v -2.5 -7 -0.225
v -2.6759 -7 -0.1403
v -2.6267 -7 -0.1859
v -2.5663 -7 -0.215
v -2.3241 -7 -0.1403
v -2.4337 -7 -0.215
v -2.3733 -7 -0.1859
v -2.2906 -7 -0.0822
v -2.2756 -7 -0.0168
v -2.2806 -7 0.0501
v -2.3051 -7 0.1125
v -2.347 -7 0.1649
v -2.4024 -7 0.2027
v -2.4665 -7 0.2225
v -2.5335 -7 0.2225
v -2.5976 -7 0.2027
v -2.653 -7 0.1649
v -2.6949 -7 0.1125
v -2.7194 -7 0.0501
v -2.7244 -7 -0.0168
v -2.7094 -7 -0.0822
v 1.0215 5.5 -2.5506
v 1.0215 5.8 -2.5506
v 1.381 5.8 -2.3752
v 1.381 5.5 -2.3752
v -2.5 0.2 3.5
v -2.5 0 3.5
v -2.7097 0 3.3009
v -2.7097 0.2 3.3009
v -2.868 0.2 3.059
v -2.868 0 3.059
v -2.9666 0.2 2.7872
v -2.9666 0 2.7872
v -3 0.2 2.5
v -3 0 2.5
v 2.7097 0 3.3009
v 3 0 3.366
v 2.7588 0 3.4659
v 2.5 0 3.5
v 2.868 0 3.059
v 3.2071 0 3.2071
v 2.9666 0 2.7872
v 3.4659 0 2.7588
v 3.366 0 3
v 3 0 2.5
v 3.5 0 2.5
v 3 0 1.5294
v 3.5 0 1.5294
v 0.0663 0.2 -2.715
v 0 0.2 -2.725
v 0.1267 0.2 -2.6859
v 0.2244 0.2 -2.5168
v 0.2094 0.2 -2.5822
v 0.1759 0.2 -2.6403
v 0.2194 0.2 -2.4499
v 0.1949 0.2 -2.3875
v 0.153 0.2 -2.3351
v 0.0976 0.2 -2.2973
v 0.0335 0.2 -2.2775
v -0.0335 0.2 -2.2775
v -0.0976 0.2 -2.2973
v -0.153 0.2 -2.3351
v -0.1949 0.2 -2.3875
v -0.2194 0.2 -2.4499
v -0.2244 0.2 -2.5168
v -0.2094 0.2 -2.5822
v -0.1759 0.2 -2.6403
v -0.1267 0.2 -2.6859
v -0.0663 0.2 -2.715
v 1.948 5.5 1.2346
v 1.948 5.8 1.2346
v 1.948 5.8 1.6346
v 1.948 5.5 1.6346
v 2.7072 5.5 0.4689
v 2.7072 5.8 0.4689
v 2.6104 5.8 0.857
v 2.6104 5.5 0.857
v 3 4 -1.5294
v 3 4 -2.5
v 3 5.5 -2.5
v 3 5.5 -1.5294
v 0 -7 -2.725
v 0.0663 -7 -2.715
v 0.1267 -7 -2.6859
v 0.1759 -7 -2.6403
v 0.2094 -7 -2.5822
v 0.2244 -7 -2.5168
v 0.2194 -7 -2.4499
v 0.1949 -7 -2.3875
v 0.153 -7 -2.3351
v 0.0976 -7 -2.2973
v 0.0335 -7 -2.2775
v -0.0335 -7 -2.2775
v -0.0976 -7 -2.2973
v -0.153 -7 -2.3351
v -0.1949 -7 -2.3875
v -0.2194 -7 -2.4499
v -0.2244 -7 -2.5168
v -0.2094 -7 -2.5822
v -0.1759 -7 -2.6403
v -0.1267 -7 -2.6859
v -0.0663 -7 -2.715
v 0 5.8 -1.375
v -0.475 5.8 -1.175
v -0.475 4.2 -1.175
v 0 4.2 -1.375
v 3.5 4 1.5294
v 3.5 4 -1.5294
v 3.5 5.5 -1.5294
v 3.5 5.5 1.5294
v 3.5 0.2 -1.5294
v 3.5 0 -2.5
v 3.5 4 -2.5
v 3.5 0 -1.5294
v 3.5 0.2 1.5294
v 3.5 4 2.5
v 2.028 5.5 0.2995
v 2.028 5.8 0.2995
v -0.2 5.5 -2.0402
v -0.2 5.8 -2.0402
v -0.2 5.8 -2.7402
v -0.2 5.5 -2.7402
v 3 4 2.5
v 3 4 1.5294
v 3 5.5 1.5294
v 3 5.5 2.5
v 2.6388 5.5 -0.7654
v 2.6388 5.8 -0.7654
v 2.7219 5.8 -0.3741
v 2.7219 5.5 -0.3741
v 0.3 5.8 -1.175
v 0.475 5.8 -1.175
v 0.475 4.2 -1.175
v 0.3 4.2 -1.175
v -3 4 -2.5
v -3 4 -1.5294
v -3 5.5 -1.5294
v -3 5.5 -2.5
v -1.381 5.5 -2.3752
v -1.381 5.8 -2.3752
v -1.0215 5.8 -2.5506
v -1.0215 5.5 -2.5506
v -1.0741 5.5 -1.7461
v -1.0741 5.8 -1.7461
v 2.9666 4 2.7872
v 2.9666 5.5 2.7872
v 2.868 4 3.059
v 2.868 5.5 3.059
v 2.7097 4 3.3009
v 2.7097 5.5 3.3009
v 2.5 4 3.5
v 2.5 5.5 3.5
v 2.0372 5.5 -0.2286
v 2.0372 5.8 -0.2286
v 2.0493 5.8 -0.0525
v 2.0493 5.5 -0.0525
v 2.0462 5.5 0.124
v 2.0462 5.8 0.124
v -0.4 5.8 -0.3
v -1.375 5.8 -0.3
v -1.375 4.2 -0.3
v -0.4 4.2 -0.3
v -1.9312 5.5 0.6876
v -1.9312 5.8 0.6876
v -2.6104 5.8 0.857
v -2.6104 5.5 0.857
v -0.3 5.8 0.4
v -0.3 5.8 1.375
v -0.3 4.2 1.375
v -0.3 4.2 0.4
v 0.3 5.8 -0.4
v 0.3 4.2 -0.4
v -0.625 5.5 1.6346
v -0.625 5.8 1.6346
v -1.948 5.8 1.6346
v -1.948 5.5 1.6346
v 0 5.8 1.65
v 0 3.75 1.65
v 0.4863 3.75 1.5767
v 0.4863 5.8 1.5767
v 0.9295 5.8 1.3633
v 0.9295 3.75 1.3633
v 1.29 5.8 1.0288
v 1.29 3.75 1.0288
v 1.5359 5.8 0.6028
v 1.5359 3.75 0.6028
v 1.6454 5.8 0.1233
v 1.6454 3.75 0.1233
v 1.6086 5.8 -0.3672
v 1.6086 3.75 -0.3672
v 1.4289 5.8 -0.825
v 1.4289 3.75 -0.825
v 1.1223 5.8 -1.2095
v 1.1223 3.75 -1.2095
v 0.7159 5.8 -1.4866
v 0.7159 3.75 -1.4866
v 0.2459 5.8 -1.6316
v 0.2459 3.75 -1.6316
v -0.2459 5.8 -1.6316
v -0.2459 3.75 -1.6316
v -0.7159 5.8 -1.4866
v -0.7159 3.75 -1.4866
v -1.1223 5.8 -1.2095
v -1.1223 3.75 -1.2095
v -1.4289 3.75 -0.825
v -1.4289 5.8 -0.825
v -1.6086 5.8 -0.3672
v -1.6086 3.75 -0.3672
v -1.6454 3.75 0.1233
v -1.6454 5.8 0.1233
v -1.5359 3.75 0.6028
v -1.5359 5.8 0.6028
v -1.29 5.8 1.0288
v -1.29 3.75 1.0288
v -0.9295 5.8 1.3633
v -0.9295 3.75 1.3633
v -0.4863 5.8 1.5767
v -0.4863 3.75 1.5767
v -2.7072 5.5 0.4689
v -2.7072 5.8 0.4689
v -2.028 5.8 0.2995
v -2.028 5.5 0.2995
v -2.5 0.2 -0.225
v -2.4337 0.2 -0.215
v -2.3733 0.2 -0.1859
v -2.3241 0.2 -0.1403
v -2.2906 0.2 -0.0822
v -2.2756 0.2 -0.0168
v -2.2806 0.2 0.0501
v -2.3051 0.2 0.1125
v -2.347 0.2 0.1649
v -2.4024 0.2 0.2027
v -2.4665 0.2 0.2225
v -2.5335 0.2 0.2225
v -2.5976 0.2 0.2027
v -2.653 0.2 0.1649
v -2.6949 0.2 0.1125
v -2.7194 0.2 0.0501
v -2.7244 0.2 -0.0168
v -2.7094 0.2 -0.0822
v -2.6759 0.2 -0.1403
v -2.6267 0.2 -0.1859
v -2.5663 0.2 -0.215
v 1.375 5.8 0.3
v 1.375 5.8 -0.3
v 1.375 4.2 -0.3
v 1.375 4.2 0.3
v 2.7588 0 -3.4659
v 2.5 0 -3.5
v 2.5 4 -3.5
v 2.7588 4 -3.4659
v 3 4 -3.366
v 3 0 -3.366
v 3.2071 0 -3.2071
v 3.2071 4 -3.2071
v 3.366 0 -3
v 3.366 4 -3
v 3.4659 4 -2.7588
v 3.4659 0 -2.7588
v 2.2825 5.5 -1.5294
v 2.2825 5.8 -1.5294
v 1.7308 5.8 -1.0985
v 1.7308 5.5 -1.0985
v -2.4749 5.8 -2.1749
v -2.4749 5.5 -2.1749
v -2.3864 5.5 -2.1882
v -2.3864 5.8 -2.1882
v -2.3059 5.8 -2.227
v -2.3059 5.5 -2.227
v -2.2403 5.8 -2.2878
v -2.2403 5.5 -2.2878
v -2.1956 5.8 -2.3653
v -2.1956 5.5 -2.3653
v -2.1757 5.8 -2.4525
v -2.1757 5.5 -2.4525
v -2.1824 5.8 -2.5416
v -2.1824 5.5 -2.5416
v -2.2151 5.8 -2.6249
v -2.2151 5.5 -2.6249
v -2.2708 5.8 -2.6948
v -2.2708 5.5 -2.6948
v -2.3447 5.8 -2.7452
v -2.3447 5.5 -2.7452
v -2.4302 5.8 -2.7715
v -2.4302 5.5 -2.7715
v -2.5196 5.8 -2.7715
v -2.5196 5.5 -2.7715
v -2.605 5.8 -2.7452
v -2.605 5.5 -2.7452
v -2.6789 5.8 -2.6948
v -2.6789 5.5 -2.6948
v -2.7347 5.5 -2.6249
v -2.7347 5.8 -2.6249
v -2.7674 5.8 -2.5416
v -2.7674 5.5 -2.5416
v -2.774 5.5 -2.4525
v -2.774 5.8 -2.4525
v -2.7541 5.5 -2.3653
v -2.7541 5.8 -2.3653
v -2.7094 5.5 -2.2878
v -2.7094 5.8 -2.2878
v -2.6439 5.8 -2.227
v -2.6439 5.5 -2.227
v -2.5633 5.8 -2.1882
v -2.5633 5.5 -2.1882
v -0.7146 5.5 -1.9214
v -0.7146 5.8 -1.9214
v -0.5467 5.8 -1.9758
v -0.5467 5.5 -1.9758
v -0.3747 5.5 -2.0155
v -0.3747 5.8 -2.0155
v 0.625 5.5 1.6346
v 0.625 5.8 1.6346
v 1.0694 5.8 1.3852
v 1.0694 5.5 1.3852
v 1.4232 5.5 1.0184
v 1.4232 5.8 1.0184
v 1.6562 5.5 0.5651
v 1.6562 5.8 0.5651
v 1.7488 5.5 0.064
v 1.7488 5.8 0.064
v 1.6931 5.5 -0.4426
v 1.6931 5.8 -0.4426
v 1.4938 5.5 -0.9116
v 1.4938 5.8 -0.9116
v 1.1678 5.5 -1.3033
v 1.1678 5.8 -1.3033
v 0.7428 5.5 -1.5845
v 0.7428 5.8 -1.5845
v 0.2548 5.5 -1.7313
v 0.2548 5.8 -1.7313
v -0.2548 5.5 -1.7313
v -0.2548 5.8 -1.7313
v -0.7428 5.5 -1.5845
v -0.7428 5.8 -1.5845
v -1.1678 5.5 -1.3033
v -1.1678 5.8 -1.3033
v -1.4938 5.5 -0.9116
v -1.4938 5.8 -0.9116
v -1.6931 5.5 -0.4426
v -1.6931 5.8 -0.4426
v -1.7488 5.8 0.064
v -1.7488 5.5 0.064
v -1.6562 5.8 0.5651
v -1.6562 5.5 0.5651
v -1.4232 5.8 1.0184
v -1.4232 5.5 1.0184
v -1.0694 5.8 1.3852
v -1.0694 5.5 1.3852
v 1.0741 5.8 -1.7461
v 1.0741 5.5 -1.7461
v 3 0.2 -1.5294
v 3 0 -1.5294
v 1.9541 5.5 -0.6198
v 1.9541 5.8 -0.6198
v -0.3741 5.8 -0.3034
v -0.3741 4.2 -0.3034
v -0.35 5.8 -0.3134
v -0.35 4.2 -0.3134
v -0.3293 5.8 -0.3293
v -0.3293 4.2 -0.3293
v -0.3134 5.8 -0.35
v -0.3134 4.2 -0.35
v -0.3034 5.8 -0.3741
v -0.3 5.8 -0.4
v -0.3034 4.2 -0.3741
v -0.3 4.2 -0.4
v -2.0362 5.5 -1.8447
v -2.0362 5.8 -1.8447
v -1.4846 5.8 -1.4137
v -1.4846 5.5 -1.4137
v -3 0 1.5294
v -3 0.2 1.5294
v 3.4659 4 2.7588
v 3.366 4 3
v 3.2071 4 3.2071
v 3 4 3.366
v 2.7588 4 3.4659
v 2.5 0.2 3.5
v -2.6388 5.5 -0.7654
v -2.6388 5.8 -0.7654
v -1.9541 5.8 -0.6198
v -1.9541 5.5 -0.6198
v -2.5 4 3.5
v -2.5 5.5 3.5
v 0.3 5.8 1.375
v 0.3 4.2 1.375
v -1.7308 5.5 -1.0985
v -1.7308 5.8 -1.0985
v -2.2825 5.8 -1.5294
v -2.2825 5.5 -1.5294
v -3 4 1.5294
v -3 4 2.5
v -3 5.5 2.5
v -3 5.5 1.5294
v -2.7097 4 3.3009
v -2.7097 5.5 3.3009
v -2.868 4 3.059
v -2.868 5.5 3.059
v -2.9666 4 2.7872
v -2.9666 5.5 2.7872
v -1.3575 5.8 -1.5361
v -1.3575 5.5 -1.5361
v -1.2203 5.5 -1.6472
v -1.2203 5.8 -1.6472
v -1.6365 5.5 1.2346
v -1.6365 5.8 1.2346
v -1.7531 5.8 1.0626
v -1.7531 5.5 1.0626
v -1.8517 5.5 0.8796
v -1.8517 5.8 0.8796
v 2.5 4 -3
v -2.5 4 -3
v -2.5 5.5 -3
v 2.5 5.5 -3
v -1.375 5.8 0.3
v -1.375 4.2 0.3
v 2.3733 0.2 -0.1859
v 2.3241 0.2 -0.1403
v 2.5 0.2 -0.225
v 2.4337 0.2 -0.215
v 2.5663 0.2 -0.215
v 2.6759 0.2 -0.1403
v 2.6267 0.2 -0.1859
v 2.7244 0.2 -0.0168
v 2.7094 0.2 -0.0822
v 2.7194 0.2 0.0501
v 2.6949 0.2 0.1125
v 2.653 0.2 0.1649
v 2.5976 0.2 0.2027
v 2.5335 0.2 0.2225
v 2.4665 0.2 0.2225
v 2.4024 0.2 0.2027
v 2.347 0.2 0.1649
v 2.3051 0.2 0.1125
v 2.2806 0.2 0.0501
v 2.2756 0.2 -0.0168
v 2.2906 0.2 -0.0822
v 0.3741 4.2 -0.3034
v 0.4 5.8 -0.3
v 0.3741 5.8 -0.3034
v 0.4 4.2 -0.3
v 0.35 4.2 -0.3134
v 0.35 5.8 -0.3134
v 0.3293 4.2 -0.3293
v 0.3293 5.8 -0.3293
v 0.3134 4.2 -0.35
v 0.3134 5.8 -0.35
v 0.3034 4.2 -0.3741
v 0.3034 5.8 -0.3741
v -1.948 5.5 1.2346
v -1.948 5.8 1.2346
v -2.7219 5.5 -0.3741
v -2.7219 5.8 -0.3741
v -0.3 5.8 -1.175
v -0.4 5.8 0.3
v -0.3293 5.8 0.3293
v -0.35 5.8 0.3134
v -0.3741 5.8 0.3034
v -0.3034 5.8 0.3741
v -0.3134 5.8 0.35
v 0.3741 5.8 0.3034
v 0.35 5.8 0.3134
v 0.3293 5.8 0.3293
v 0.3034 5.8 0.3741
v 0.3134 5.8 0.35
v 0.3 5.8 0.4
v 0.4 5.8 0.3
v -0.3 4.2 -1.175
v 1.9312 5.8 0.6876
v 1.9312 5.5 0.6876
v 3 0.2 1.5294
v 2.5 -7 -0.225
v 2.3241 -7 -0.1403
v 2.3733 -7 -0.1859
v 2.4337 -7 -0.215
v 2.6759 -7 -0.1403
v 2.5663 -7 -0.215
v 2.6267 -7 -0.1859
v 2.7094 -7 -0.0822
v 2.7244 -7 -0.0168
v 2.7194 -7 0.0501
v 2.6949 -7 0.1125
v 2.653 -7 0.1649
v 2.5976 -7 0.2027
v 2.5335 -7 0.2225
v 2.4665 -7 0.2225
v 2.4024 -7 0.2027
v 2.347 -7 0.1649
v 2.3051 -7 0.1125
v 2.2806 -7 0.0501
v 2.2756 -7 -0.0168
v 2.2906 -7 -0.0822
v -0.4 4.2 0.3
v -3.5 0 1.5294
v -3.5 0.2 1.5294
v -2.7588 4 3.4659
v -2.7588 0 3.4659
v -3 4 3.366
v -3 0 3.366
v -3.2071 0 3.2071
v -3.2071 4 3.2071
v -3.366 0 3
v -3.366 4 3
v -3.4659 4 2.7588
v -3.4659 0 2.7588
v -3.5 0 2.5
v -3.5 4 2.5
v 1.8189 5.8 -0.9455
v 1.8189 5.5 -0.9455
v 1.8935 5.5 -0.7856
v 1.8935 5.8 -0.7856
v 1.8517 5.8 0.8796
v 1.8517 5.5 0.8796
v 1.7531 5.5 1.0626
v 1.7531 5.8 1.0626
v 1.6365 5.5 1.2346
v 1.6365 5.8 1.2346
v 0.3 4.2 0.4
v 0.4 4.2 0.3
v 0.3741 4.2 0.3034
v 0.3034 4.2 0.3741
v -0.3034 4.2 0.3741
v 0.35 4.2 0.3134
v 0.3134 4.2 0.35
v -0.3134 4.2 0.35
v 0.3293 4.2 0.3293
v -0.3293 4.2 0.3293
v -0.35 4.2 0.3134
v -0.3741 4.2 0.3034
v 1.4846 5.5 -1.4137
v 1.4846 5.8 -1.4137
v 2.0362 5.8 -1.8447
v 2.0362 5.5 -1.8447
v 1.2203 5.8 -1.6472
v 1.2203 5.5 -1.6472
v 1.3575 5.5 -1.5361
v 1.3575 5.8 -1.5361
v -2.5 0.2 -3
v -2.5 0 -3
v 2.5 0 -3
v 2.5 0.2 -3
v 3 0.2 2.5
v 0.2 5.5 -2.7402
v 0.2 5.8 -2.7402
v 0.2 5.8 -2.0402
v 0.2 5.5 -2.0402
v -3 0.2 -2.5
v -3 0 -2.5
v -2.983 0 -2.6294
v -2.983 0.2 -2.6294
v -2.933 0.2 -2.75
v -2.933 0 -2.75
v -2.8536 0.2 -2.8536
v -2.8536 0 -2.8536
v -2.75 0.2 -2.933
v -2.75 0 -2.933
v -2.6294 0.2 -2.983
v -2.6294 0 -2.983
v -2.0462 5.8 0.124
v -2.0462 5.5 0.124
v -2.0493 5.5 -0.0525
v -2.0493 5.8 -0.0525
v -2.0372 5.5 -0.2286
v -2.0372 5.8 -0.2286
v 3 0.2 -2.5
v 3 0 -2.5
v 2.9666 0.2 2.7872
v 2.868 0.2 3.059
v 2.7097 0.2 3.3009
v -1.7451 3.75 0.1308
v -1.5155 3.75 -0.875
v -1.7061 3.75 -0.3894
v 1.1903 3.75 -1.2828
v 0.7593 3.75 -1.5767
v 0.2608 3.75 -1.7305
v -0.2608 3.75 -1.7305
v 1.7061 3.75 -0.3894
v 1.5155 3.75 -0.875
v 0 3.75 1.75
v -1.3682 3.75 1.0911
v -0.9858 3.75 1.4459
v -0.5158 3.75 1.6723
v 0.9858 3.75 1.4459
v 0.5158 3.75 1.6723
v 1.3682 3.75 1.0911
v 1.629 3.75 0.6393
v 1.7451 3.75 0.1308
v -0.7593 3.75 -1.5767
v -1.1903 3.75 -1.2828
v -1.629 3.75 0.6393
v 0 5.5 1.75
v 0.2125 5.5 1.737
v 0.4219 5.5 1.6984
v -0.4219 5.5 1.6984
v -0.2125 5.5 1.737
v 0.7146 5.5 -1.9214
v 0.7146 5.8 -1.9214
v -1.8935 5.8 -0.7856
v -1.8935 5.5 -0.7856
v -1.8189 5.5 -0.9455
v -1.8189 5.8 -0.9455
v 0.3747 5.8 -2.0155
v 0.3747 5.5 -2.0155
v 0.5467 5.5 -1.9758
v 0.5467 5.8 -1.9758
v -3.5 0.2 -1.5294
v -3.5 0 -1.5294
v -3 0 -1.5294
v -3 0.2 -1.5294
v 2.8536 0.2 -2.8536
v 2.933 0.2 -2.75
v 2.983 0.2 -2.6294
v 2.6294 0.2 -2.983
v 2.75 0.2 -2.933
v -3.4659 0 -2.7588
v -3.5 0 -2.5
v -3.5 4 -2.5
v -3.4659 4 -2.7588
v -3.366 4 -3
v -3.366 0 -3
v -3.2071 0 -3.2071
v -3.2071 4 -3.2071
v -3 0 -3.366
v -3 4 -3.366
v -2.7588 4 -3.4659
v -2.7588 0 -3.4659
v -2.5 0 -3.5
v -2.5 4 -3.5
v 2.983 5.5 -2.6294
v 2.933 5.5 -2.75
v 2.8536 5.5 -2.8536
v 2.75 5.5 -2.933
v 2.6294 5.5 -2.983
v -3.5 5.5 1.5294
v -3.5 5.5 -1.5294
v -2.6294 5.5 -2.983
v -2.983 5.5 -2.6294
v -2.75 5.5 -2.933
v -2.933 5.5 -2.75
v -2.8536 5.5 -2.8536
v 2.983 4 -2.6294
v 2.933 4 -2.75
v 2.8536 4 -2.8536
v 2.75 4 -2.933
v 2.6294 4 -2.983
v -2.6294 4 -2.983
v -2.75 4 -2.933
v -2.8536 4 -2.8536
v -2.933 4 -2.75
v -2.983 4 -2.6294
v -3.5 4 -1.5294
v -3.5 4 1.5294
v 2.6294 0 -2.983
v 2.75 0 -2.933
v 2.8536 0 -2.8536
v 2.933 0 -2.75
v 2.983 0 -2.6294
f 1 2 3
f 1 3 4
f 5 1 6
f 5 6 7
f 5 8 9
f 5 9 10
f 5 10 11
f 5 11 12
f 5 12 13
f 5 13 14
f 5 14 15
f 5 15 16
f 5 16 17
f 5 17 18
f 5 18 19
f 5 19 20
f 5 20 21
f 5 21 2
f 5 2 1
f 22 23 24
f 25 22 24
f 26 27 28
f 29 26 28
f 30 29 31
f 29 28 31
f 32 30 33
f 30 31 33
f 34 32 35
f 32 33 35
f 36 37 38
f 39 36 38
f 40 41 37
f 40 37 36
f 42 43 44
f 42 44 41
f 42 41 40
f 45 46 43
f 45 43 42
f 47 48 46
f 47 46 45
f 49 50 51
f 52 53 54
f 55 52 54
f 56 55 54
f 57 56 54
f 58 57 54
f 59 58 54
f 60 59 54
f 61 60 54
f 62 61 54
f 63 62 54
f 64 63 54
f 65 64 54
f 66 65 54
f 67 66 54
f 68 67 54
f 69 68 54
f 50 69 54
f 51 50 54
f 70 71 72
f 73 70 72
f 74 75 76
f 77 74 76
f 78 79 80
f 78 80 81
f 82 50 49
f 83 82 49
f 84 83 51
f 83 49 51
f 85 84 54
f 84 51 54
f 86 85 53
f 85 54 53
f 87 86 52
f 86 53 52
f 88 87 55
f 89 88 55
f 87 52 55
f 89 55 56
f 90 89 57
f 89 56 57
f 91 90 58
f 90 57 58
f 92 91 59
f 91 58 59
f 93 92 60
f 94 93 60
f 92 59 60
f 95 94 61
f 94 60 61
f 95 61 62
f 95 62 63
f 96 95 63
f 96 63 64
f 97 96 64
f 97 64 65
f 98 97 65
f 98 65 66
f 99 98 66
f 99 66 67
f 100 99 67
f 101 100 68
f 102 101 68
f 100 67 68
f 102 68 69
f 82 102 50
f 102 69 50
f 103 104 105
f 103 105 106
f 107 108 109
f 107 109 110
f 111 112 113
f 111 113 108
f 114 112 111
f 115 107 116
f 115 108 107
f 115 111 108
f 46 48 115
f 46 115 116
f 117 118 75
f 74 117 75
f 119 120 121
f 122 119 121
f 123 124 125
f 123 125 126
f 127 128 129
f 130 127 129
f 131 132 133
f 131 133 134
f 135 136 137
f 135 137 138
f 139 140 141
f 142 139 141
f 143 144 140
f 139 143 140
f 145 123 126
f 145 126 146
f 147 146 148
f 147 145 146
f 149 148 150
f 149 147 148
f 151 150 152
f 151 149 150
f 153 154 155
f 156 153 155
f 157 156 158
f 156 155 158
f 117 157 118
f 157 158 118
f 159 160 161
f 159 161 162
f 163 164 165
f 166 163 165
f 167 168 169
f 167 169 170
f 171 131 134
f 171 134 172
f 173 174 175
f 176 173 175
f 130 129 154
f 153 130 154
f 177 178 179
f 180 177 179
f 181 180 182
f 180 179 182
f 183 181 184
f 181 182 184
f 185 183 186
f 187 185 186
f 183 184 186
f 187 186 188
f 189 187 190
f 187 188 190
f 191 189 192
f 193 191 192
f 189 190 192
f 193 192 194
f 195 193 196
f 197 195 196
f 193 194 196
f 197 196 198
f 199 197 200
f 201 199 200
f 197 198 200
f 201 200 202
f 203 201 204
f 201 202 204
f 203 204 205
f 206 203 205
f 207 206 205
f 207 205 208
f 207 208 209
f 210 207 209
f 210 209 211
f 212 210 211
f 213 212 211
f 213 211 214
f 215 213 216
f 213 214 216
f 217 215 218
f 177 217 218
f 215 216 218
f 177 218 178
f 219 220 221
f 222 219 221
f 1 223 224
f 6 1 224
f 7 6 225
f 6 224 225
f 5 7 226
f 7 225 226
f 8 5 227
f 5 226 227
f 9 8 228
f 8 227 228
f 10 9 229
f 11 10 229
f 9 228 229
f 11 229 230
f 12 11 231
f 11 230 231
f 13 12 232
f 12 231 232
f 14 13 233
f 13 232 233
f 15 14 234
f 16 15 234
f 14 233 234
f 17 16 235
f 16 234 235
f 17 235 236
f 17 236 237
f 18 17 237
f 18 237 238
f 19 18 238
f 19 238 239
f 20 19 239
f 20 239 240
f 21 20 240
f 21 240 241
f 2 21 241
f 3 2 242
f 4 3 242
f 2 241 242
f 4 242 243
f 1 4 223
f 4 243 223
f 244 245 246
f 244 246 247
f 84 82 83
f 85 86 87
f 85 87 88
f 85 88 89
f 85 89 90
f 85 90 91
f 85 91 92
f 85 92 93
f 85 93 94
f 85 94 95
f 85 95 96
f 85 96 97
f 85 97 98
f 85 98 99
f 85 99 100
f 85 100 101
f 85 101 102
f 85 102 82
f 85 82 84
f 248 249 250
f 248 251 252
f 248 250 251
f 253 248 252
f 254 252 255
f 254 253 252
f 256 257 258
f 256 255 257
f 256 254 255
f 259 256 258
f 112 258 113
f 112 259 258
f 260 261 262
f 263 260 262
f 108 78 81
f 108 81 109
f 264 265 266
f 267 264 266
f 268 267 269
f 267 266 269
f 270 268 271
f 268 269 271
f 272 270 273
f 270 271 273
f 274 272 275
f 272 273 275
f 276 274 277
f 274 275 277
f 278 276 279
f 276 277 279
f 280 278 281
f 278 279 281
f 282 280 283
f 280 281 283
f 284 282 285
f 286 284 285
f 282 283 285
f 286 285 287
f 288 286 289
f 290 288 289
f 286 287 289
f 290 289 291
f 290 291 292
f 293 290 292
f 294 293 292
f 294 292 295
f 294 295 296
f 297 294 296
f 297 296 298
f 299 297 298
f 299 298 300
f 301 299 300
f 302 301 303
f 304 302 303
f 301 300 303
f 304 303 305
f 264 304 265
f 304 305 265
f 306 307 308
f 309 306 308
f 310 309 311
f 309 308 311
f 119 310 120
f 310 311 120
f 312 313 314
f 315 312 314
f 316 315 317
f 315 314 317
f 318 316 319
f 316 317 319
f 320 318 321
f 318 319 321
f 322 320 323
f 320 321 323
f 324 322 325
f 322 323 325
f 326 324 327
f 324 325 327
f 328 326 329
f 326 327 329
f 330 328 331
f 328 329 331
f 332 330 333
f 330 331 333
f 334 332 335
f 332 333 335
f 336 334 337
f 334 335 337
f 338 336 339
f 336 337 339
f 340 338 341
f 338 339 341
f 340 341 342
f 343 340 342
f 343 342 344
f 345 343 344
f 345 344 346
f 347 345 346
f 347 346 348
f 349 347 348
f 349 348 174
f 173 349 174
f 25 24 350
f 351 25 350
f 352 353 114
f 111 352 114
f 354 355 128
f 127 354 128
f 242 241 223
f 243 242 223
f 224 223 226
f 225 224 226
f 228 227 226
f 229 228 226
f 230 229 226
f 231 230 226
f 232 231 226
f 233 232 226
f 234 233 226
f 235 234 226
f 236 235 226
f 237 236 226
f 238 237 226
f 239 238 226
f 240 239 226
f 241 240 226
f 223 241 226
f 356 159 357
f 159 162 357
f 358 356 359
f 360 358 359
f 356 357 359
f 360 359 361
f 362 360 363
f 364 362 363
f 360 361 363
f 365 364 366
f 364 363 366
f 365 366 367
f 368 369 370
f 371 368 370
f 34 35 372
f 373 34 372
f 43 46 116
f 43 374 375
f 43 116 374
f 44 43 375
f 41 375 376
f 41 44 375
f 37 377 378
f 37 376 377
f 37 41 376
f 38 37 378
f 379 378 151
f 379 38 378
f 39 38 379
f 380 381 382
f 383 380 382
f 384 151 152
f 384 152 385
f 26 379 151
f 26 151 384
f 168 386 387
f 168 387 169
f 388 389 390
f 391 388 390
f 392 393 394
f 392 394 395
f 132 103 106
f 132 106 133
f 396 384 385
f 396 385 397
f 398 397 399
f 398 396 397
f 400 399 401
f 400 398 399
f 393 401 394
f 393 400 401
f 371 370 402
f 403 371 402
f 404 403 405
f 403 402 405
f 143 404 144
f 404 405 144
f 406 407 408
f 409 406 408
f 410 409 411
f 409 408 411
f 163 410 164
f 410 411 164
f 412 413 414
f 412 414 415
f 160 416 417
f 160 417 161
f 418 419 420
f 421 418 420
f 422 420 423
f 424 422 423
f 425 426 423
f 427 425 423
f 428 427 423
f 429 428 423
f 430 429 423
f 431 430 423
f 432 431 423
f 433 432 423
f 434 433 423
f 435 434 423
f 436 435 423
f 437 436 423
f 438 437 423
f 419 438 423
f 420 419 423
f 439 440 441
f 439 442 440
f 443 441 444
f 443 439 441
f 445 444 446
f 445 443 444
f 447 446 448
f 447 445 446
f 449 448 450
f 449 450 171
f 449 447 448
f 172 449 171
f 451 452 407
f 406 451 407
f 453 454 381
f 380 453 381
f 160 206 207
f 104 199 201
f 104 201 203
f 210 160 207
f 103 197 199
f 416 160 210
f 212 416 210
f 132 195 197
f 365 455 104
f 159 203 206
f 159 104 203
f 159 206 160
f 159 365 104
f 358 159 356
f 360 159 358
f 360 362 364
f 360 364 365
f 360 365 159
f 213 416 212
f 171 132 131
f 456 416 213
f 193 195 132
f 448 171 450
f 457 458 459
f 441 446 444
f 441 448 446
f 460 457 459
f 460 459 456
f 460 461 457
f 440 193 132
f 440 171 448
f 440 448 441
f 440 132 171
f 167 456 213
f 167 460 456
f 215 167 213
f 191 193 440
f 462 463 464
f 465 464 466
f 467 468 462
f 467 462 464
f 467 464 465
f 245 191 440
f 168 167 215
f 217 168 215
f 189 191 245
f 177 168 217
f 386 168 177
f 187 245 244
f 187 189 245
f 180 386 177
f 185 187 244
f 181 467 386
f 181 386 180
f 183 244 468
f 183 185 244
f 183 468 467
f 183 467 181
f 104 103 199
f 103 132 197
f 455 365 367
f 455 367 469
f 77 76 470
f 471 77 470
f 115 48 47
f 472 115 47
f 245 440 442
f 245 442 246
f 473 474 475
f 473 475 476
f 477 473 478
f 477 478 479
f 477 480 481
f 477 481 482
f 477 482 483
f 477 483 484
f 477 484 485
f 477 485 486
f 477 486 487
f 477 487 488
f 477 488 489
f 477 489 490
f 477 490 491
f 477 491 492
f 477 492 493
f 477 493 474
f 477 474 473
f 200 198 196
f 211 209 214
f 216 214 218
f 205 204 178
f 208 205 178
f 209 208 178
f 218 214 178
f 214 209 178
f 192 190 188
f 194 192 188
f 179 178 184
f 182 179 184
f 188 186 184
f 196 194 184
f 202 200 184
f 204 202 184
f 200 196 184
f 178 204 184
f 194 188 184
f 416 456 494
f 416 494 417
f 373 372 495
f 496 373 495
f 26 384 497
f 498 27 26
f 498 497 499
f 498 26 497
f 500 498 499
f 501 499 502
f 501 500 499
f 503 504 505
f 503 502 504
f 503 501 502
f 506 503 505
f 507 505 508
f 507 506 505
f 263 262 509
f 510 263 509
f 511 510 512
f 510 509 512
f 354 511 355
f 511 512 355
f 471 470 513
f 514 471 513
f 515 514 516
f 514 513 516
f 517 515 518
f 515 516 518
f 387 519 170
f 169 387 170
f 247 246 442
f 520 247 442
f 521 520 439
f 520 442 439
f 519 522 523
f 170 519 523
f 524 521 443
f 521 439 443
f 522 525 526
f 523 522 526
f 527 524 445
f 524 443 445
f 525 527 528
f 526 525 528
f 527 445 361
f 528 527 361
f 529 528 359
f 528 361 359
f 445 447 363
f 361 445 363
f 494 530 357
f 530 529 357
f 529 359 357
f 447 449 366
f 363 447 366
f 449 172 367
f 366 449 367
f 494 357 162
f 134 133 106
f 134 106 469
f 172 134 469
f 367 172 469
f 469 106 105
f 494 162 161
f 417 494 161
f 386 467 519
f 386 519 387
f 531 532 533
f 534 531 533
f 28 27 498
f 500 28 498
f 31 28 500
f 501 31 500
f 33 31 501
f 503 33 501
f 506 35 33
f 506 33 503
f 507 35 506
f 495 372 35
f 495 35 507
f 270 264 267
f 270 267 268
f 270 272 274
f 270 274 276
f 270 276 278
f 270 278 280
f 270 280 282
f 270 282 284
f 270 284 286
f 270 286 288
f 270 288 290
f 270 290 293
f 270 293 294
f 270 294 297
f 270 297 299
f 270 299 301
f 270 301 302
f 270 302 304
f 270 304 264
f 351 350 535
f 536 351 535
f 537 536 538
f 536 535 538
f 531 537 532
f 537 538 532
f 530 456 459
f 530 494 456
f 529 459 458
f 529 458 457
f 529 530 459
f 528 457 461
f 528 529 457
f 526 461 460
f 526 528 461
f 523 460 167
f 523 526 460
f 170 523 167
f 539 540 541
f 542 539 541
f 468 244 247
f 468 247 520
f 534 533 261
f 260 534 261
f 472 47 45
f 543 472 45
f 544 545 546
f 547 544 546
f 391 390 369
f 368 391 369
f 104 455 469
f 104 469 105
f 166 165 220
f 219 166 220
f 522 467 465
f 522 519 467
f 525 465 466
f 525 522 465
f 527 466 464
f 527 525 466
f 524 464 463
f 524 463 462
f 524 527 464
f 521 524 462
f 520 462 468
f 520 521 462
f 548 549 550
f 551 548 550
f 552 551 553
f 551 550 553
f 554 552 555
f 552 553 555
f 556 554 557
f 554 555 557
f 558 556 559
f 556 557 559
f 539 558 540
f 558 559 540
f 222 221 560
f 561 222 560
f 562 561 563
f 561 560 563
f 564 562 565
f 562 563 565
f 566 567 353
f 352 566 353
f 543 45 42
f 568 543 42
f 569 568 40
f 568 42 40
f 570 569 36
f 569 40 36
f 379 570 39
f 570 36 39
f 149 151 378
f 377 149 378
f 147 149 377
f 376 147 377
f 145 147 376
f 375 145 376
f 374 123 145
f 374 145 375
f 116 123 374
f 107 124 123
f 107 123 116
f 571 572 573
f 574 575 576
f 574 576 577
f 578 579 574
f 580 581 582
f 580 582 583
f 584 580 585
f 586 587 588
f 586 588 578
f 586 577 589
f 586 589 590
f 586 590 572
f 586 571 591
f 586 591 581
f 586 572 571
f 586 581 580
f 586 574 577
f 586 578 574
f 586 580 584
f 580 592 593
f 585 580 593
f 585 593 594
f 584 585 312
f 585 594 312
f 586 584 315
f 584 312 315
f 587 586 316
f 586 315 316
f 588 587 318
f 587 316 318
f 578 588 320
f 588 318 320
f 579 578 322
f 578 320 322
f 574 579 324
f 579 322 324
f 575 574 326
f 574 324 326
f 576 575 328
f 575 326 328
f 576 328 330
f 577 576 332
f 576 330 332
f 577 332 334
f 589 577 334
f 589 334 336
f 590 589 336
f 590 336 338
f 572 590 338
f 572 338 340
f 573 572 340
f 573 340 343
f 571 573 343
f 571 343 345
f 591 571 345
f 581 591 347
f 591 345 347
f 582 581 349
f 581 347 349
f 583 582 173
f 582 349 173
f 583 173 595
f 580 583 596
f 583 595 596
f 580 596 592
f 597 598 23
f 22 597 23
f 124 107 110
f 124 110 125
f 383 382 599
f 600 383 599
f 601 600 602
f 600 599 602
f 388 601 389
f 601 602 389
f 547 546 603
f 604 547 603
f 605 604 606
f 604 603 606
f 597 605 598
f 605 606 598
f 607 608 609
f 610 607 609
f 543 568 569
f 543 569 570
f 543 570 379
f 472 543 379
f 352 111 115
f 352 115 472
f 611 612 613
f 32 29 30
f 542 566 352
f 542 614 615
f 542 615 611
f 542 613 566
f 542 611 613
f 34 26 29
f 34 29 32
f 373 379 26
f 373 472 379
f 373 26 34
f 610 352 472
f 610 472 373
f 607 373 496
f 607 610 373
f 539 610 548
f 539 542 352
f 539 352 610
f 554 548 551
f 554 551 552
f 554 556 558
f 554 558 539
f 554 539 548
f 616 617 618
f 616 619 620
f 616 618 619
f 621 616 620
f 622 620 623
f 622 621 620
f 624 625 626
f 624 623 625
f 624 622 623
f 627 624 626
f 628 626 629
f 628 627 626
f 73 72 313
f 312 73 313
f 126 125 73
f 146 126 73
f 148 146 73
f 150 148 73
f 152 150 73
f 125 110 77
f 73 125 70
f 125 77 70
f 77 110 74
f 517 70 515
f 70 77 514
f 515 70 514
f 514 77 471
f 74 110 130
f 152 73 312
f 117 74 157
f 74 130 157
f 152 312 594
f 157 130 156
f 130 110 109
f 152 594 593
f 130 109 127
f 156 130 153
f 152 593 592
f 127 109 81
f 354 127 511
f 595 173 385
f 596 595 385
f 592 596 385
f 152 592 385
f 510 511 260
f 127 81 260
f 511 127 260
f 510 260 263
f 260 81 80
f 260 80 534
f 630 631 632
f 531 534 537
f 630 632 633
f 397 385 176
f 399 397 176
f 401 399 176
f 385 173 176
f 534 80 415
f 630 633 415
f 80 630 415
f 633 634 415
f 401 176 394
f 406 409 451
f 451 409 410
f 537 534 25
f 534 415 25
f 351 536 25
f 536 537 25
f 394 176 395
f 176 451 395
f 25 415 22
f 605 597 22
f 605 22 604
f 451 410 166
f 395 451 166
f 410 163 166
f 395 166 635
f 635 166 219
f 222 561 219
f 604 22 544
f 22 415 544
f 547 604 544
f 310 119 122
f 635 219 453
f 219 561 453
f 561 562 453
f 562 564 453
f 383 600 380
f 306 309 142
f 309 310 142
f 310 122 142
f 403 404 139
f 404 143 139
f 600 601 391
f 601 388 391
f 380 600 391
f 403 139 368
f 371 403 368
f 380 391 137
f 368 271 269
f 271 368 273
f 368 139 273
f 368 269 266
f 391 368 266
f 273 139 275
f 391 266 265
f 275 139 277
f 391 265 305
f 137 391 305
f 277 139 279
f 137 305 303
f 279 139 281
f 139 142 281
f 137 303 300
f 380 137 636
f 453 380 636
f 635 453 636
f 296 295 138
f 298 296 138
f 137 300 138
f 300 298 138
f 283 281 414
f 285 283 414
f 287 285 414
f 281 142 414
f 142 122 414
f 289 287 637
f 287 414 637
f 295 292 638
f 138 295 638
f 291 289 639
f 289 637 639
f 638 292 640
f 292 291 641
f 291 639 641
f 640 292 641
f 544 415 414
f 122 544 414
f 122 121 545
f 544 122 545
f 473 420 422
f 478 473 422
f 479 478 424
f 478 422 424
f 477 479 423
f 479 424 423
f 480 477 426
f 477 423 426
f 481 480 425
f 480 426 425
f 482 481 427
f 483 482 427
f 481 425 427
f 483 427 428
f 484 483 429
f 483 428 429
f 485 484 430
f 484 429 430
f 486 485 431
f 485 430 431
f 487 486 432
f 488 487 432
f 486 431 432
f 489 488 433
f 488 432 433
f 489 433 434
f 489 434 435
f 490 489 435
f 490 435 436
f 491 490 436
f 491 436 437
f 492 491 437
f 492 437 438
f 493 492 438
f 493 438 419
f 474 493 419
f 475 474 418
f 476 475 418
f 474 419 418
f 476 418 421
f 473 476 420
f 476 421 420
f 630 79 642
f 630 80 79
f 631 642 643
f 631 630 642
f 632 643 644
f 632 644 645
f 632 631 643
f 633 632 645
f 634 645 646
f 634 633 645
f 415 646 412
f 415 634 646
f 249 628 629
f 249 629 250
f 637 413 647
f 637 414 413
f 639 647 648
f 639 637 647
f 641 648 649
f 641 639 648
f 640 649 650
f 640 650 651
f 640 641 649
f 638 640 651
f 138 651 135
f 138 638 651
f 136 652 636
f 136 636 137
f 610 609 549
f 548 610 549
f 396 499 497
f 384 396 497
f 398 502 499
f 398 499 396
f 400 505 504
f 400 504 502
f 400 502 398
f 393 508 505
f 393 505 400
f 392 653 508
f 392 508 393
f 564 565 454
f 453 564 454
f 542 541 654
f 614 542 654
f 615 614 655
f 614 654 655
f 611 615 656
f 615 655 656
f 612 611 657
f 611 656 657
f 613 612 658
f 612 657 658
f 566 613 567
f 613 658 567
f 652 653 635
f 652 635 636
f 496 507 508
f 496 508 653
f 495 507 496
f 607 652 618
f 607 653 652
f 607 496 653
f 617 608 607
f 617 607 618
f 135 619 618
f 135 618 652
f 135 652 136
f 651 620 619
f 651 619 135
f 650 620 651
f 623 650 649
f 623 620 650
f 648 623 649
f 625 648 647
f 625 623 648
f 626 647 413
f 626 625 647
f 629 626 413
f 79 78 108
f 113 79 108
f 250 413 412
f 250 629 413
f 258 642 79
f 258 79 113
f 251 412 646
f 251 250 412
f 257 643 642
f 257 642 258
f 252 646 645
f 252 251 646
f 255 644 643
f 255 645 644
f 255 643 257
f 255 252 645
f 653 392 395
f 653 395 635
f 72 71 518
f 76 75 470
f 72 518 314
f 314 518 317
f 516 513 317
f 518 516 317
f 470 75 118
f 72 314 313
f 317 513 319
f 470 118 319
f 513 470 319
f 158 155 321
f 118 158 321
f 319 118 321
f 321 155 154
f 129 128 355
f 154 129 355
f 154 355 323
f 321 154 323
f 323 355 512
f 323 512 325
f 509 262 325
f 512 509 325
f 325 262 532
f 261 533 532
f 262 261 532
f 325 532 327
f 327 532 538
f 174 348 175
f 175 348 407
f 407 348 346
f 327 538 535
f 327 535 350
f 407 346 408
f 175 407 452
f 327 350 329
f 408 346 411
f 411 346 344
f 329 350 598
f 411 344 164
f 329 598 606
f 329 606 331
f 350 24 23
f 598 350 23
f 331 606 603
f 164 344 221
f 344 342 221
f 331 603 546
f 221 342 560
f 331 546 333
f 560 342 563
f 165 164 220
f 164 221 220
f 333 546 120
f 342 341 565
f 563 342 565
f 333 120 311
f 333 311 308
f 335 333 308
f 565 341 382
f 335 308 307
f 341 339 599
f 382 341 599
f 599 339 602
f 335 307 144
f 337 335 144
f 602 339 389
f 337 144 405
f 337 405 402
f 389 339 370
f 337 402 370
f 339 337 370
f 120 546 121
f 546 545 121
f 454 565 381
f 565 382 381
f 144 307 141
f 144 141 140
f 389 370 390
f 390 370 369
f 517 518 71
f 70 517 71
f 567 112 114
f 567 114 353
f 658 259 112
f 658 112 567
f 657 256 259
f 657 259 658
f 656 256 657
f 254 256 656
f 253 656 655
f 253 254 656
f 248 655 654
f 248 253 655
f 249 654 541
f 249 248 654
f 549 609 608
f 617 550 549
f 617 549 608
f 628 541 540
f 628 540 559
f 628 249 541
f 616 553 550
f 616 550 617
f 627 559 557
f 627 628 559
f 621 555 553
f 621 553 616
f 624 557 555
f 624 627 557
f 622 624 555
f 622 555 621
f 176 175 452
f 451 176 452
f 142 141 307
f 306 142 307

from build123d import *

# Parameters (mm, degrees)
BOSS_EXTRUDE1_DEPTH   = 5.5
SKETCH3_R             = 1.75
CUT_EXTRUDE1_DEPTH    = 1.75
SKETCH4_R             = 1.65
BOSS_EXTRUDE2_DEPTH   = 2.05
CUT_EXTRUDE2_DEPTH    = 1.6
FILLET1_R             = 0.1
BOSS_EXTRUDE3_START   = 0.3
BOSS_EXTRUDE3_DEPTH   = 0.3
SKETCH7_R             = 0.3
BOSS_EXTRUDE4_DEPTH   = 0.3
CUT_EXTRUDE3_START    = -1.5
CUT_EXTRUDE3_DEPTH    = 1.5
FILLET2_R             = 0.5
CUT_EXTRUDE7_DEPTH    = 0.2
SKETCH11_R            = 0.225
BOSS_EXTRUDE6_DEPTH   = 7.2
BOSS_EXTRUDE6_2_DEPTH = 7.2
BOSS_EXTRUDE6_3_DEPTH = 7.2


with BuildPart() as part:
    # Sketch1 → Boss-Extrude1 (new body)
    with BuildSketch(Plane(origin=(0, 0, 0), x_dir=(1, 0, 0), z_dir=(0, 1, 0))):
        with BuildLine():
            Line((2.5, -3.5), (-2.5, -3.5))
            ThreePointArc((-2.5, -3.5), (-3.207106781, -3.207106781), (-3.5, -2.5))
            Line((-3.5, -2.5), (-3.5, 2.5))
            ThreePointArc((-3.5, 2.5), (-3.207106781, 3.207106781), (-2.5, 3.5))
            Line((-2.5, 3.5), (2.5, 3.5))
            ThreePointArc((2.5, 3.5), (3.207106781, 3.207106781), (3.5, 2.5))
            Line((3.5, 2.5), (3.5, -2.5))
            ThreePointArc((3.5, -2.5), (3.207106781, -3.207106781), (2.5, -3.5))
        make_face()
    extrude(amount=BOSS_EXTRUDE1_DEPTH)

    # Sketch3 → Cut-Extrude1 (cut)
    with BuildSketch(Plane(origin=(0, 5.5, 0), x_dir=(1, 0, 0), z_dir=(0, 1, 0))):
        with Locations(Location((0, 0, 0), (0, 0, 270))):
            Circle(SKETCH3_R)
    extrude(amount=-CUT_EXTRUDE1_DEPTH, mode=Mode.SUBTRACT)

    # Sketch6 → Boss-Extrude3 (add)
    with BuildSketch(Plane(origin=(0, 5.5, 0), x_dir=(1, 0, 0), z_dir=(0, 1, 0)).offset(BOSS_EXTRUDE3_START)):
        with BuildLine():
            Line((-0.625, -1.634587104), (-1.948025053, -1.634587104))
            Line((-1.948025053, -1.634587104), (-1.948025053, -1.234587104))
            Line((-1.948025053, -1.234587104), (-1.636549627, -1.234587104))
            ThreePointArc((-1.636549627, -1.234587104), (-1.804732041, -0.972338553), (-1.931232927, -0.687633175))
            Line((-1.931232927, -0.687633175), (-2.610439935, -0.856978501))
            Line((-2.610439935, -0.856978501), (-2.707208693, -0.468860211))
            Line((-2.707208693, -0.468860211), (-2.028001685, -0.299514884))
            ThreePointArc((-2.028001685, -0.299514884), (-2.049687775, -0.035777433), (-2.0372192, 0.22855619))
            Line((-2.0372192, 0.22855619), (-2.72192252, 0.374094373))
            Line((-2.72192252, 0.374094373), (-2.638757844, 0.765353413))
            Line((-2.638757844, 0.765353413), (-1.954054524, 0.61981523))
            ThreePointArc((-1.954054524, 0.61981523), (-1.857930963, 0.866367437), (-1.730848049, 1.098483059))
            Line((-1.730848049, 1.098483059), (-2.282455576, 1.529446092))
            Line((-2.282455576, 1.529446092), (-2.036190986, 1.844650393))
            Line((-2.036190986, 1.844650393), (-1.484583459, 1.413687361))
            ThreePointArc((-1.484583459, 1.413687361), (-1.290106802, 1.593149221), (-1.074132643, 1.746063878))
            Line((-1.074132643, 1.746063878), (-1.380992446, 2.37521971))
            Line((-1.380992446, 2.37521971), (-1.021474827, 2.550568169))
            Line((-1.021474827, 2.550568169), (-0.714615024, 1.921412336))
            ThreePointArc((-0.714615024, 1.921412336), (-0.461149661, 1.997458633), (-0.2, 2.040220576))
            Line((-0.2, 2.040220576), (-0.2, 2.740220576))
            Line((-0.2, 2.740220576), (0.2, 2.740220576))
            Line((0.2, 2.740220576), (0.2, 2.040220576))
            ThreePointArc((0.2, 2.040220576), (0.461149661, 1.997458633), (0.714615024, 1.921412336))
            Line((0.714615024, 1.921412336), (1.021474827, 2.550568169))
            Line((1.021474827, 2.550568169), (1.380992446, 2.37521971))
            Line((1.380992446, 2.37521971), (1.074132643, 1.746063878))
            ThreePointArc((1.074132643, 1.746063878), (1.290106802, 1.593149221), (1.484583459, 1.413687361))
            Line((1.484583459, 1.413687361), (2.036190986, 1.844650393))
            Line((2.036190986, 1.844650393), (2.282455576, 1.529446092))
            Line((2.282455576, 1.529446092), (1.730848049, 1.098483059))
            ThreePointArc((1.730848049, 1.098483059), (1.857930963, 0.866367437), (1.954054524, 0.61981523))
            Line((1.954054524, 0.61981523), (2.638757844, 0.765353413))
            Line((2.638757844, 0.765353413), (2.72192252, 0.374094373))
            Line((2.72192252, 0.374094373), (2.0372192, 0.22855619))
            ThreePointArc((2.0372192, 0.22855619), (2.049687775, -0.035777433), (2.028001685, -0.299514884))
            Line((2.028001685, -0.299514884), (2.707208693, -0.468860211))
            Line((2.707208693, -0.468860211), (2.610439935, -0.856978501))
            Line((2.610439935, -0.856978501), (1.931232927, -0.687633175))
            ThreePointArc((1.931232927, -0.687633175), (1.804732041, -0.972338553), (1.636549627, -1.234587104))
            Line((1.636549627, -1.234587104), (1.948025053, -1.234587104))
            Line((1.948025053, -1.234587104), (1.948025053, -1.634587104))
            Line((1.948025053, -1.634587104), (0.625, -1.634587104))
            ThreePointArc((0.625, -1.634587104), (0, 1.75), (-0.625, -1.634587104))
        make_face()
    extrude(amount=-BOSS_EXTRUDE3_DEPTH)

    # Sketch7 → Boss-Extrude4 (add)
    with BuildSketch(Plane(origin=(0, 5.5, 0), x_dir=(1, 0, 0), z_dir=(0, 1, 0))):
        with Locations(Location((-2.474873734, 2.474873734, 0), (0, 0, 270))):
            Circle(SKETCH7_R)
    extrude(amount=BOSS_EXTRUDE4_DEPTH)

    # Sketch2 → Cut-Extrude3 (cut)
    with BuildSketch(Plane(origin=(0, 5.5, 0), x_dir=(1, 0, 0), z_dir=(0, 1, 0)).offset(CUT_EXTRUDE3_START)):
        with BuildLine():
            ThreePointArc((-3.5, -2.5), (-3.207106781, -3.207106781), (-2.5, -3.5))
            ThreePointArc((-2.5, -3.5), (-2.868033989, -3.059016994), (-3, -2.5))
            Line((-3, -2.5), (-3, -1.529446092))
            Line((-3, -1.529446092), (-3.5, -1.529446092))
            Line((-3.5, -1.529446092), (-3.5, -2.5))
        make_face()
        with BuildLine():
            ThreePointArc((2.5, -3.5), (3.207106781, -3.207106781), (3.5, -2.5))
            Line((3.5, -2.5), (3.5, -1.529446092))
            Line((3.5, -1.529446092), (3, -1.529446092))
            Line((3, -1.529446092), (3, -2.5))
            ThreePointArc((3, -2.5), (2.868033989, -3.059016994), (2.5, -3.5))
        make_face()
        with BuildLine():
            Line((3, 1.529446092), (3.5, 1.529446092))
            Line((3.5, 1.529446092), (3.5, 2.5))
            ThreePointArc((3.5, 2.5), (3.207106781, 3.207106781), (2.5, 3.5))
            Line((2.5, 3.5), (-2.5, 3.5))
            ThreePointArc((-2.5, 3.5), (-3.207106781, 3.207106781), (-3.5, 2.5))
            Line((-3.5, 2.5), (-3.5, 1.529446092))
            Line((-3.5, 1.529446092), (-3, 1.529446092))
            Line((-3, 1.529446092), (-3, 3))
            Line((-3, 3), (3, 3))
            Line((3, 3), (3, 1.529446092))
        make_face()
    extrude(amount=CUT_EXTRUDE3_DEPTH, mode=Mode.SUBTRACT)

    # Fillet2
    fillet2_edges = [part.edges().sort_by_distance(p)[0] for p in [
        (3, 4.75, -3),
        (-3, 4.75, -3),
    ]]
    fillet(fillet2_edges, radius=FILLET2_R)

    # Sketch10 → Cut-Extrude7 (cut)
    with BuildSketch(Plane(origin=(0, 0, 0), x_dir=(1, 0, 0), z_dir=(0, 1, 0))):
        with BuildLine():
            Line((3, 2.5), (3, 1.529446092))
            Line((3, 1.529446092), (3.5, 1.529446092))
            Line((3.5, 1.529446092), (3.5, -1.529446092))
            Line((3.5, -1.529446092), (3, -1.529446092))
            Line((3, -1.529446092), (3, -2.5))
            ThreePointArc((3, -2.5), (2.868033989, -3.059016994), (2.5, -3.5))
            Line((2.5, -3.5), (-2.5, -3.5))
            ThreePointArc((-2.5, -3.5), (-2.868033989, -3.059016994), (-3, -2.5))
            Line((-3, -2.5), (-3, -1.529446092))
            Line((-3, -1.529446092), (-3.5, -1.529446092))
            Line((-3.5, -1.529446092), (-3.5, 1.529446092))
            Line((-3.5, 1.529446092), (-3, 1.529446092))
            Line((-3, 1.529446092), (-3, 2.5))
            ThreePointArc((-3, 2.5), (-2.853553391, 2.853553391), (-2.5, 3))
            Line((-2.5, 3), (2.5, 3))
            ThreePointArc((2.5, 3), (2.853553391, 2.853553391), (3, 2.5))
        make_face()
    extrude(amount=CUT_EXTRUDE7_DEPTH, mode=Mode.SUBTRACT)


with BuildPart() as body_2:
    # Sketch4 → Boss-Extrude2 (new body)
    with BuildSketch(Plane(origin=(0, 3.75, 0), x_dir=(1, 0, 0), z_dir=(0, 1, 0))):
        with Locations(Location((0, 0, 0), (0, 0, 270))):
            Circle(SKETCH4_R)
    extrude(amount=BOSS_EXTRUDE2_DEPTH)

    # Sketch5 → Cut-Extrude2 (cut)
    with BuildSketch(Plane(origin=(0, 5.8, 0), x_dir=(1, 0, 0), z_dir=(0, 1, 0))):
        Polygon((-0.3, 0.3), (-0.3, 1.175), (-0.475, 1.175), (0, 1.375), (0.475, 1.175), (0.3, 1.175), (0.3, 0.3), (1.375, 0.3), (1.375, -0.3), (0.3, -0.3), (0.3, -1.375), (-0.3, -1.375), (-0.3, -0.3), (-1.375, -0.3), (-1.375, 0.3), align=None)
    extrude(amount=-CUT_EXTRUDE2_DEPTH, mode=Mode.SUBTRACT)

    # Fillet1
    fillet1_edges = [body_2.edges().sort_by_distance(p)[0] for p in [
        (-0.3, 5, -0.3),
        (0.3, 5, -0.3),
        (0.3, 5, 0.3),
        (-0.3, 5, 0.3),
    ]]
    fillet(fillet1_edges, radius=FILLET1_R)


with BuildPart() as body_3:
    # Sketch11 → Boss-Extrude6 (new body)
    with BuildSketch(Plane.XZ.offset(-0.2)):
        with Locations(Location((2.5, 0, 0), (0, 0, 270))):
            Circle(SKETCH11_R)
    extrude(amount=BOSS_EXTRUDE6_DEPTH)


with BuildPart() as body_4:
    # Sketch11 → Boss-Extrude6 2 (new body)
    with BuildSketch(Plane.XZ.offset(-0.2)):
        with Locations(Location((0, -2.5, 0), (0, 0, 270))):
            Circle(SKETCH11_R)
    extrude(amount=BOSS_EXTRUDE6_2_DEPTH)


with BuildPart() as body_5:
    # Sketch11 → Boss-Extrude6 3 (new body)
    with BuildSketch(Plane.XZ.offset(-0.2)):
        with Locations(Location((-2.5, 0, 0), (0, 0, 270))):
            Circle(SKETCH11_R)
    extrude(amount=BOSS_EXTRUDE6_3_DEPTH)


solid = Compound([part.part, body_2.part, body_3.part, body_4.part, body_5.part])
